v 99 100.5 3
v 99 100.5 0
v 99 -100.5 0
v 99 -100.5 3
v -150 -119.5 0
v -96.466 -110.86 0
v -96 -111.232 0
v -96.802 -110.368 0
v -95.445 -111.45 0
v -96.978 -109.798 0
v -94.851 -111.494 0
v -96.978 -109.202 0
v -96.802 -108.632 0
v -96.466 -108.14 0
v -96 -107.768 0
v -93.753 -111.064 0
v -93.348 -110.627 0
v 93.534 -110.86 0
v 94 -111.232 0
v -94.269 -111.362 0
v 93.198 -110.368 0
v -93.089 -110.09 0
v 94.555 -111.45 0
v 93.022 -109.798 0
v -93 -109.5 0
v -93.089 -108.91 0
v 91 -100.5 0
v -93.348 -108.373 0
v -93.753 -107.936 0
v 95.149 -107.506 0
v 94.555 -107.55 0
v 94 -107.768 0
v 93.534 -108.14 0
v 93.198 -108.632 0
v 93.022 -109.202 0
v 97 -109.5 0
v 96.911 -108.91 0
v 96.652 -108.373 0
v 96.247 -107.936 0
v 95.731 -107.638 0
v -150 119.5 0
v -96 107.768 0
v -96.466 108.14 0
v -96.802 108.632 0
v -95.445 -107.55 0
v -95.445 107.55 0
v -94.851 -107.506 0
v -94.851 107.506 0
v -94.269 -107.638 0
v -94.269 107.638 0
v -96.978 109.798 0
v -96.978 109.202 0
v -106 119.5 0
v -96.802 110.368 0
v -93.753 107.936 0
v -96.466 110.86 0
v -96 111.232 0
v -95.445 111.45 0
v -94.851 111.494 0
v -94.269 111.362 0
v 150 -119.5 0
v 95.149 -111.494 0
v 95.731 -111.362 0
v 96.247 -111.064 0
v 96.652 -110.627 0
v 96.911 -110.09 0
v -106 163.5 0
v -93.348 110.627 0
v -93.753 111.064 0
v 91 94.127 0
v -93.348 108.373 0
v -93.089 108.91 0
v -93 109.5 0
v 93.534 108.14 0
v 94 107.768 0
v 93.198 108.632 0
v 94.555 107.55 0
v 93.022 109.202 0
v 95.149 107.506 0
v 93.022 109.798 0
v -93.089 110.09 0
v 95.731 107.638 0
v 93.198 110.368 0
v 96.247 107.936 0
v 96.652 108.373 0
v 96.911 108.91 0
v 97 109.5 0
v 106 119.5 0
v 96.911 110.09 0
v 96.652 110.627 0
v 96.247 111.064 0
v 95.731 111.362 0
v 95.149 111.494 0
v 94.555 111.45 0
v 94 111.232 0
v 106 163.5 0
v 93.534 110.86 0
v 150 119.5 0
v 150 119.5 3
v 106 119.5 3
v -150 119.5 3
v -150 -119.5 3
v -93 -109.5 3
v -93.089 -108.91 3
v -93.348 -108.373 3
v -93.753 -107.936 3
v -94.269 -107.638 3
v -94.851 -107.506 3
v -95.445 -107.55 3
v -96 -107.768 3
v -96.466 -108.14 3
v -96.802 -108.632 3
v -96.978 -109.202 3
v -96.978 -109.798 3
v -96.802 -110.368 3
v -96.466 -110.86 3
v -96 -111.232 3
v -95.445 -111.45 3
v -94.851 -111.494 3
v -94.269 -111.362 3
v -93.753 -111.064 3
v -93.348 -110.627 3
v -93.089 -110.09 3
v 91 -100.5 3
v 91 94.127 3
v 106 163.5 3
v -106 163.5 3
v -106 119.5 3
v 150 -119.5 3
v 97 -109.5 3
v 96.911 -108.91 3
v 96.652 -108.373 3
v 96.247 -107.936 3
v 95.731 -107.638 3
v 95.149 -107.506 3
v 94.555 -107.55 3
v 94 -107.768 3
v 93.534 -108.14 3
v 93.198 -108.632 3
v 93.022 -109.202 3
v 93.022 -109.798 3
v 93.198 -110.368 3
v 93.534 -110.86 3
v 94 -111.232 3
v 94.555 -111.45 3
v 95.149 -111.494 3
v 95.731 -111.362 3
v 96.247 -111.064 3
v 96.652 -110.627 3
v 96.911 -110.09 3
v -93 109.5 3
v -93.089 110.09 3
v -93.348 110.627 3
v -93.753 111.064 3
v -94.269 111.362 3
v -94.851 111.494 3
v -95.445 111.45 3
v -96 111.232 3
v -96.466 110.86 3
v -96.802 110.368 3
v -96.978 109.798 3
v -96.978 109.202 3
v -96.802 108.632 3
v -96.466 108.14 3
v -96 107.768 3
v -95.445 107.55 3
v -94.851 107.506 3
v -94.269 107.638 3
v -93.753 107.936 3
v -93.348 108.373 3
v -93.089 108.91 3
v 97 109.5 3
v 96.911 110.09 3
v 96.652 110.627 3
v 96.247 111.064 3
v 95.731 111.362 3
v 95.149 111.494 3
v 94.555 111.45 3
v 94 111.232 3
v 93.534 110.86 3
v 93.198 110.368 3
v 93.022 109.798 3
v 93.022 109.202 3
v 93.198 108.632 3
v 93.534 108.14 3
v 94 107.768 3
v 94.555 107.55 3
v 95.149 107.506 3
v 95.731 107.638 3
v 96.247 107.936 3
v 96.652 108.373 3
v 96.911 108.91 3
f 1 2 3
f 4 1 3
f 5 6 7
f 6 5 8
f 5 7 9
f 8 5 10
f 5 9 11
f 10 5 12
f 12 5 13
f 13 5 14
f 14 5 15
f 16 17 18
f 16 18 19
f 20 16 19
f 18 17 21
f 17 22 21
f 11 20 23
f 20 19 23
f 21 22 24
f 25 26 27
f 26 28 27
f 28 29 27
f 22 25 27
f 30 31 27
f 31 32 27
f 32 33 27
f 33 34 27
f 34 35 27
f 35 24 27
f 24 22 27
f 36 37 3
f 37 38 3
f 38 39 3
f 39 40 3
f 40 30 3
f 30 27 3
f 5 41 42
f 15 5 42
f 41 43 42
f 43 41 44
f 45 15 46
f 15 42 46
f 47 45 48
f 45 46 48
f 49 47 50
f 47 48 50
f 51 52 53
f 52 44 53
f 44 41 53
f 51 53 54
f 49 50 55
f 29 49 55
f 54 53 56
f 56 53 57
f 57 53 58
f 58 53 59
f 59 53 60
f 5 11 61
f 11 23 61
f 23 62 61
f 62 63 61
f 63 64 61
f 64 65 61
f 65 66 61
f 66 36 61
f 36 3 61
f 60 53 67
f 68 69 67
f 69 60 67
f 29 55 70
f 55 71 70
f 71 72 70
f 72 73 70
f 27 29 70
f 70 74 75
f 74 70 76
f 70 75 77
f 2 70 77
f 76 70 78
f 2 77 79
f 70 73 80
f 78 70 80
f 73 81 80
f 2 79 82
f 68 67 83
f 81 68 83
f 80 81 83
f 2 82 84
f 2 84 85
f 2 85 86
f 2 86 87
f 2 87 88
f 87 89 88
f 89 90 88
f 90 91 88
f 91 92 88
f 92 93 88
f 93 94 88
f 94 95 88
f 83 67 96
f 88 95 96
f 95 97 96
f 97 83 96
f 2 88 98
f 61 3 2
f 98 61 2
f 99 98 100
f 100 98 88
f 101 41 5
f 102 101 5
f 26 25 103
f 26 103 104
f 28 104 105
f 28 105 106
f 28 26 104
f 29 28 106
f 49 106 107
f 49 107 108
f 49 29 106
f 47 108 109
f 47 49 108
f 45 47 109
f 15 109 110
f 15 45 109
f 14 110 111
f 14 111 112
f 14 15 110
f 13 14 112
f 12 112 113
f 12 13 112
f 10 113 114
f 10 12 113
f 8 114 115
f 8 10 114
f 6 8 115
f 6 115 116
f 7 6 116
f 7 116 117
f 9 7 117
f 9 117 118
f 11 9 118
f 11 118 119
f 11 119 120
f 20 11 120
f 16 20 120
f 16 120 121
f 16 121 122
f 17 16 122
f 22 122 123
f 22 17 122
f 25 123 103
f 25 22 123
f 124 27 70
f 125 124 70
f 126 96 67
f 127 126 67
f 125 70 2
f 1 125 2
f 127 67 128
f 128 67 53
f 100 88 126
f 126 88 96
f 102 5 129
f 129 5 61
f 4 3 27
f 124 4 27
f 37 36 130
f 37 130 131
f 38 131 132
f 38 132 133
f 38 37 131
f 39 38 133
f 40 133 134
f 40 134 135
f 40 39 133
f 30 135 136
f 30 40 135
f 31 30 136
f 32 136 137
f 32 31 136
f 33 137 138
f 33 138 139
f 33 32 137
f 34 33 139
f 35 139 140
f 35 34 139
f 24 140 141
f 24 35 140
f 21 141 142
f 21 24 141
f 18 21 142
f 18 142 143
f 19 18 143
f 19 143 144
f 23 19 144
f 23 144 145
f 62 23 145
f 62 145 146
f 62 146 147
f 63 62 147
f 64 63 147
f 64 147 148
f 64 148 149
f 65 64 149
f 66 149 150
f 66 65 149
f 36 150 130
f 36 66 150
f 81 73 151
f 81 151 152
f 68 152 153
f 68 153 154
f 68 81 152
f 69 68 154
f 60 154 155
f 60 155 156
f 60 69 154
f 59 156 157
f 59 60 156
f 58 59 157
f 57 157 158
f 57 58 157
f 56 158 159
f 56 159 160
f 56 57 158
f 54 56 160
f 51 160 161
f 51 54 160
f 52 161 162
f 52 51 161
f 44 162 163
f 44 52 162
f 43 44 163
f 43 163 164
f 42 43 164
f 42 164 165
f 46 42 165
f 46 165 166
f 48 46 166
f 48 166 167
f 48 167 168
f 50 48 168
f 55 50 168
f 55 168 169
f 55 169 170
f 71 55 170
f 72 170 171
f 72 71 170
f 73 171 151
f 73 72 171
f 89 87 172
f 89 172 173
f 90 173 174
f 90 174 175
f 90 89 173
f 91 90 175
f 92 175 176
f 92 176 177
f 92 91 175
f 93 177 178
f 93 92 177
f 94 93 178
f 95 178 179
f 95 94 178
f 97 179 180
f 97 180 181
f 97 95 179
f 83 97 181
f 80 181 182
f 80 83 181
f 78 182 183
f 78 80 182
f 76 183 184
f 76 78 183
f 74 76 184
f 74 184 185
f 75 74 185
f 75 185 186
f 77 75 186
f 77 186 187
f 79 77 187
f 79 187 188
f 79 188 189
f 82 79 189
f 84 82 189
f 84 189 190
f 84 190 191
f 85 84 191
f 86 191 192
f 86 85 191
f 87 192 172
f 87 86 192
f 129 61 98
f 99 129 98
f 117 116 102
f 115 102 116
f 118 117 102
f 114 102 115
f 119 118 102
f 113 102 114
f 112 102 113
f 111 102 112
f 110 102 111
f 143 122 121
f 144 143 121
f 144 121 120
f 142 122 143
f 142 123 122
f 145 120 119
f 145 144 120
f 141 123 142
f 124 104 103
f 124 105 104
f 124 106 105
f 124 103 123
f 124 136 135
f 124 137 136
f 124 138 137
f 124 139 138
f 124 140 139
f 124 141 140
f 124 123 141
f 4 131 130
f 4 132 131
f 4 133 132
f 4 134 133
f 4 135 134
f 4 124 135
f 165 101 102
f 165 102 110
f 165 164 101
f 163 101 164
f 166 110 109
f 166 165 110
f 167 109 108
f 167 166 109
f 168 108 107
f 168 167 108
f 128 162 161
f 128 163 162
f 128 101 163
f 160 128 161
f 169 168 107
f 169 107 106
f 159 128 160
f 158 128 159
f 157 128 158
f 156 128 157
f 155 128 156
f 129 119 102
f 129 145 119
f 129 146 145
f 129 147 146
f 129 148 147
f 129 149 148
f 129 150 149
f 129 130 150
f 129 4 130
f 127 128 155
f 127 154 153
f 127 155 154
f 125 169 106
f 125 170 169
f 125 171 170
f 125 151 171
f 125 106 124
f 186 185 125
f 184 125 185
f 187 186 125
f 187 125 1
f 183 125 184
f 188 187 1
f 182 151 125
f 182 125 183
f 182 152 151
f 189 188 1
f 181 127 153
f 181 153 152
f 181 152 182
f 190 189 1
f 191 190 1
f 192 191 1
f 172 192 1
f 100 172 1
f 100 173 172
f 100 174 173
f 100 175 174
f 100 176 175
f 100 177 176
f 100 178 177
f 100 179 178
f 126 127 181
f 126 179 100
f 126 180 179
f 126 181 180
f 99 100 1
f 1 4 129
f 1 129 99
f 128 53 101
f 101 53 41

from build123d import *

# Parameters (mm, degrees)
SKETCH1_R           = 2
BOSS_EXTRUDE1_DEPTH = 3


with BuildPart() as part:
    # Sketch1 → Boss-Extrude1 (new body)
    with BuildSketch(Plane.XY):
        Polygon((-150, -119.5), (150, -119.5), (150, 119.5), (106, 119.5), (106, 163.5), (-106, 163.5), (-106, 119.5), (-150, 119.5), align=None)
        with Locations((-95, -109.5)):
            Circle(SKETCH1_R, mode=Mode.SUBTRACT)
        with Locations((95, -109.5)):
            Circle(SKETCH1_R, mode=Mode.SUBTRACT)
        Polygon((91, 94.126666667), (99, 100.5), (99, -100.5), (91, -100.5), align=None, mode=Mode.SUBTRACT)
        with Locations((-95, 109.5)):
            Circle(SKETCH1_R, mode=Mode.SUBTRACT)
        with Locations((95, 109.5)):
            Circle(SKETCH1_R, mode=Mode.SUBTRACT)
    extrude(amount=BOSS_EXTRUDE1_DEPTH)


solid = part.part
